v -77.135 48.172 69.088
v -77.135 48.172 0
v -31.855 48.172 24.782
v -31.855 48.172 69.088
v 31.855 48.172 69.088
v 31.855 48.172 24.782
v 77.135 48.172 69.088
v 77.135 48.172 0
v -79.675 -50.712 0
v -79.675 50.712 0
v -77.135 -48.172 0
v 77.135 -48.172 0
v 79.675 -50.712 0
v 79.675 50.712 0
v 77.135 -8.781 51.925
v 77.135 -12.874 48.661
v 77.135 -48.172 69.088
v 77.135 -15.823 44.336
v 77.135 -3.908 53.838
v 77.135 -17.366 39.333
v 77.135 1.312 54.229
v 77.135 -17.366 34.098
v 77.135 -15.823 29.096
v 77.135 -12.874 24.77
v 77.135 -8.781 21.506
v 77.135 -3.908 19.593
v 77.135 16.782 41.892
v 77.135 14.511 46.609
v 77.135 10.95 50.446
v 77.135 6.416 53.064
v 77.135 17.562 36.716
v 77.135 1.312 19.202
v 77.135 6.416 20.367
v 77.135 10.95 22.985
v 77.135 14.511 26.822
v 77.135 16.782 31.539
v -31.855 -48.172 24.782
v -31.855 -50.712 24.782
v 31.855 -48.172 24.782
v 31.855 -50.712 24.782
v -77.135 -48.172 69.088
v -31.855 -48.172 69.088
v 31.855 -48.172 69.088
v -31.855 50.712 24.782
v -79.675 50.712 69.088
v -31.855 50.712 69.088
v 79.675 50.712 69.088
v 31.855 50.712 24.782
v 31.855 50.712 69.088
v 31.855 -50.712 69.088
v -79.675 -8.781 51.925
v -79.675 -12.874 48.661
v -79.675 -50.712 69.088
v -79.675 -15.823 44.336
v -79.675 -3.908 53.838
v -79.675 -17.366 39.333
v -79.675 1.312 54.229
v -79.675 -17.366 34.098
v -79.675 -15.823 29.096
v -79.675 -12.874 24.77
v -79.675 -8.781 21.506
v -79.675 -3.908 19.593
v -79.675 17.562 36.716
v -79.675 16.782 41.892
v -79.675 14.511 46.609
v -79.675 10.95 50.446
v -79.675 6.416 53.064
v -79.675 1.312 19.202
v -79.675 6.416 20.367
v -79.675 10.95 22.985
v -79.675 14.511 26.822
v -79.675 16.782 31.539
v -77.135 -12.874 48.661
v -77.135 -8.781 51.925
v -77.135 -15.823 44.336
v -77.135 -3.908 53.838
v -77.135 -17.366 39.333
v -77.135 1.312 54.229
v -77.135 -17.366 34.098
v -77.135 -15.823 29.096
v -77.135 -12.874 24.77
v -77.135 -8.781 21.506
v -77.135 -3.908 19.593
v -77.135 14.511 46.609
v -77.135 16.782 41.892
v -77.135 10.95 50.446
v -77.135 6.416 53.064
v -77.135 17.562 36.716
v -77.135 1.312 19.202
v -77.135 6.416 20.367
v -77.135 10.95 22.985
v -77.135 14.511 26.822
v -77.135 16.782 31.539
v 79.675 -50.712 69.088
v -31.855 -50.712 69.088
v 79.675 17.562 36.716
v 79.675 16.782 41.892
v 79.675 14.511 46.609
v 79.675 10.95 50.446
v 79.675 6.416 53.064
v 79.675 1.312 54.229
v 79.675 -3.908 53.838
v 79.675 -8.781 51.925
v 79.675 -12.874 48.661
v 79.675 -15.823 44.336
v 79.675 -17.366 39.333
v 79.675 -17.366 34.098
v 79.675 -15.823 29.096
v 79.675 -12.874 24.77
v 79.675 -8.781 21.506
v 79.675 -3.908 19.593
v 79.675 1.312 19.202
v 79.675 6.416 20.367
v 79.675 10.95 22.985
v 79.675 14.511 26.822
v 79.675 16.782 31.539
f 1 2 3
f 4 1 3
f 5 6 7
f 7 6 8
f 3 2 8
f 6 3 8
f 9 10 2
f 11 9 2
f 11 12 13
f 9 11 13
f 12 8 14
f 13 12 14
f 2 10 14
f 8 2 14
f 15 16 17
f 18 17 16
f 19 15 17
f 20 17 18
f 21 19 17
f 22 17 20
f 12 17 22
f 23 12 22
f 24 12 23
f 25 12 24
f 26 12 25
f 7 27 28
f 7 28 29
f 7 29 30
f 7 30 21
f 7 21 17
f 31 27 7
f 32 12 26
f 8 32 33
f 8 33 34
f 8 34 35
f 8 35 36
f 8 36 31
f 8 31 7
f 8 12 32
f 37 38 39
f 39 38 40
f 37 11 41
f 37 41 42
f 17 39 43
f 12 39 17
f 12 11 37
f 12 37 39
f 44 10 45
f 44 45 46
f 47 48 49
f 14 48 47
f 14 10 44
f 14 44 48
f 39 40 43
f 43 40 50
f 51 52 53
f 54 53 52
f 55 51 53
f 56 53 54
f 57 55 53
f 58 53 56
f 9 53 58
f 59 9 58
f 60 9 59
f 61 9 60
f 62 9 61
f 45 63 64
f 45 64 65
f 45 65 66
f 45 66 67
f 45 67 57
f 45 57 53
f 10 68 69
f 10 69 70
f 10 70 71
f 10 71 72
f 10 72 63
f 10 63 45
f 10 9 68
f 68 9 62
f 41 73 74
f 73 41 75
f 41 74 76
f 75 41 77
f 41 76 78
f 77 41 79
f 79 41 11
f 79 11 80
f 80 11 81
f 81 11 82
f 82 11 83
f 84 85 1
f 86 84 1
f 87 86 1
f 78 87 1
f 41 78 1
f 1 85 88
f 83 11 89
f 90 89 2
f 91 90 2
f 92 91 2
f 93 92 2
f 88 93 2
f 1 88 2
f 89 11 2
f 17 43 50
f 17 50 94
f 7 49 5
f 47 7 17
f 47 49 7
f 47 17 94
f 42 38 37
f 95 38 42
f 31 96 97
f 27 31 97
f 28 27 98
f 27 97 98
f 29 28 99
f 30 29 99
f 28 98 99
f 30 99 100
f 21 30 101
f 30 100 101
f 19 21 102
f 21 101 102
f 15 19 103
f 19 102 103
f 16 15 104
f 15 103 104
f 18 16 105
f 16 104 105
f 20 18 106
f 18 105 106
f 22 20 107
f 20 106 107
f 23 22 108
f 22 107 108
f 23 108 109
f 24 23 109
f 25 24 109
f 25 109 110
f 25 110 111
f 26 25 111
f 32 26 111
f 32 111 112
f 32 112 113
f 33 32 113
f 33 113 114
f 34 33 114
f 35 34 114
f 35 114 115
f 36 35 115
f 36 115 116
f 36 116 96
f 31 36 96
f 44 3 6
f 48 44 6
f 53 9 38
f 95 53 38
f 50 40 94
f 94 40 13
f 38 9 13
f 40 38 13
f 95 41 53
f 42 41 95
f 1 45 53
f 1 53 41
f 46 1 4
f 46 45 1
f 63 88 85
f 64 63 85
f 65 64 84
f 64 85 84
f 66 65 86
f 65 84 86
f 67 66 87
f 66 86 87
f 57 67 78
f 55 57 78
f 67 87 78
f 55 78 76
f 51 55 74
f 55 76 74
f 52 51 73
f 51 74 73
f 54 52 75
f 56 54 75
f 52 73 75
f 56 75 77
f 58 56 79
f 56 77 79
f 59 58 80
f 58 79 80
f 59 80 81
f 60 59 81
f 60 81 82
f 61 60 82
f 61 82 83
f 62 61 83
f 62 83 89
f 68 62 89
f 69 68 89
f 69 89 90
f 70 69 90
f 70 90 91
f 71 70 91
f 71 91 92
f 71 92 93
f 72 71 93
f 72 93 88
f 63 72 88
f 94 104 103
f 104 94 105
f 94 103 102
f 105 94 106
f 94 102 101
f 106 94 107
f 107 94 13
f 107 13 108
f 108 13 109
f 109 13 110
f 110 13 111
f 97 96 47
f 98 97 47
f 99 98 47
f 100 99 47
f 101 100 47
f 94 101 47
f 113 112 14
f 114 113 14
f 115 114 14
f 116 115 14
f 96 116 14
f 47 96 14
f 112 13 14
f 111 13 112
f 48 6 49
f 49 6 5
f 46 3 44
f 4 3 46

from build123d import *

# Parameters (mm, degrees)
F0_W     = 159.349978
F0_H     = 101.423756
F1_DEPTH = 69.088
F2_T     = -2.54
F3_W     = 63.709832
F3_H     = 88.611978
F4_DEPTH = 101.424755
F5_R     = 17.562361
F6_DEPTH = 159.350978


with BuildPart() as f1:
    # F0 (on Top) → F1 (new body)
    with BuildSketch(Plane.XY):
        Rectangle(F0_W, F0_H)
    extrude(amount=F1_DEPTH)

    # F2
    f2_openings = [f1.faces().sort_by_distance(p)[0] for p in [
        (0, 0, 69.088),
        (0, 0, 0),
    ]]
    offset(amount=F2_T, openings=f2_openings)

    # F3 (on face) → F4 (cut, through all)
    with BuildSketch(Plane.XZ.offset(50.711878)):
        with Locations((0, 69.088)):
            Rectangle(F3_W, F3_H)
    extrude(amount=-F4_DEPTH, mode=Mode.SUBTRACT)

    # F5 (on face) → F6 (cut, through all)
    with BuildSketch(Plane.YZ.offset(79.674989)):
        with Locations((0, 36.715534)):
            Circle(F5_R)
    extrude(amount=-F6_DEPTH, mode=Mode.SUBTRACT)


solid = f1.part
